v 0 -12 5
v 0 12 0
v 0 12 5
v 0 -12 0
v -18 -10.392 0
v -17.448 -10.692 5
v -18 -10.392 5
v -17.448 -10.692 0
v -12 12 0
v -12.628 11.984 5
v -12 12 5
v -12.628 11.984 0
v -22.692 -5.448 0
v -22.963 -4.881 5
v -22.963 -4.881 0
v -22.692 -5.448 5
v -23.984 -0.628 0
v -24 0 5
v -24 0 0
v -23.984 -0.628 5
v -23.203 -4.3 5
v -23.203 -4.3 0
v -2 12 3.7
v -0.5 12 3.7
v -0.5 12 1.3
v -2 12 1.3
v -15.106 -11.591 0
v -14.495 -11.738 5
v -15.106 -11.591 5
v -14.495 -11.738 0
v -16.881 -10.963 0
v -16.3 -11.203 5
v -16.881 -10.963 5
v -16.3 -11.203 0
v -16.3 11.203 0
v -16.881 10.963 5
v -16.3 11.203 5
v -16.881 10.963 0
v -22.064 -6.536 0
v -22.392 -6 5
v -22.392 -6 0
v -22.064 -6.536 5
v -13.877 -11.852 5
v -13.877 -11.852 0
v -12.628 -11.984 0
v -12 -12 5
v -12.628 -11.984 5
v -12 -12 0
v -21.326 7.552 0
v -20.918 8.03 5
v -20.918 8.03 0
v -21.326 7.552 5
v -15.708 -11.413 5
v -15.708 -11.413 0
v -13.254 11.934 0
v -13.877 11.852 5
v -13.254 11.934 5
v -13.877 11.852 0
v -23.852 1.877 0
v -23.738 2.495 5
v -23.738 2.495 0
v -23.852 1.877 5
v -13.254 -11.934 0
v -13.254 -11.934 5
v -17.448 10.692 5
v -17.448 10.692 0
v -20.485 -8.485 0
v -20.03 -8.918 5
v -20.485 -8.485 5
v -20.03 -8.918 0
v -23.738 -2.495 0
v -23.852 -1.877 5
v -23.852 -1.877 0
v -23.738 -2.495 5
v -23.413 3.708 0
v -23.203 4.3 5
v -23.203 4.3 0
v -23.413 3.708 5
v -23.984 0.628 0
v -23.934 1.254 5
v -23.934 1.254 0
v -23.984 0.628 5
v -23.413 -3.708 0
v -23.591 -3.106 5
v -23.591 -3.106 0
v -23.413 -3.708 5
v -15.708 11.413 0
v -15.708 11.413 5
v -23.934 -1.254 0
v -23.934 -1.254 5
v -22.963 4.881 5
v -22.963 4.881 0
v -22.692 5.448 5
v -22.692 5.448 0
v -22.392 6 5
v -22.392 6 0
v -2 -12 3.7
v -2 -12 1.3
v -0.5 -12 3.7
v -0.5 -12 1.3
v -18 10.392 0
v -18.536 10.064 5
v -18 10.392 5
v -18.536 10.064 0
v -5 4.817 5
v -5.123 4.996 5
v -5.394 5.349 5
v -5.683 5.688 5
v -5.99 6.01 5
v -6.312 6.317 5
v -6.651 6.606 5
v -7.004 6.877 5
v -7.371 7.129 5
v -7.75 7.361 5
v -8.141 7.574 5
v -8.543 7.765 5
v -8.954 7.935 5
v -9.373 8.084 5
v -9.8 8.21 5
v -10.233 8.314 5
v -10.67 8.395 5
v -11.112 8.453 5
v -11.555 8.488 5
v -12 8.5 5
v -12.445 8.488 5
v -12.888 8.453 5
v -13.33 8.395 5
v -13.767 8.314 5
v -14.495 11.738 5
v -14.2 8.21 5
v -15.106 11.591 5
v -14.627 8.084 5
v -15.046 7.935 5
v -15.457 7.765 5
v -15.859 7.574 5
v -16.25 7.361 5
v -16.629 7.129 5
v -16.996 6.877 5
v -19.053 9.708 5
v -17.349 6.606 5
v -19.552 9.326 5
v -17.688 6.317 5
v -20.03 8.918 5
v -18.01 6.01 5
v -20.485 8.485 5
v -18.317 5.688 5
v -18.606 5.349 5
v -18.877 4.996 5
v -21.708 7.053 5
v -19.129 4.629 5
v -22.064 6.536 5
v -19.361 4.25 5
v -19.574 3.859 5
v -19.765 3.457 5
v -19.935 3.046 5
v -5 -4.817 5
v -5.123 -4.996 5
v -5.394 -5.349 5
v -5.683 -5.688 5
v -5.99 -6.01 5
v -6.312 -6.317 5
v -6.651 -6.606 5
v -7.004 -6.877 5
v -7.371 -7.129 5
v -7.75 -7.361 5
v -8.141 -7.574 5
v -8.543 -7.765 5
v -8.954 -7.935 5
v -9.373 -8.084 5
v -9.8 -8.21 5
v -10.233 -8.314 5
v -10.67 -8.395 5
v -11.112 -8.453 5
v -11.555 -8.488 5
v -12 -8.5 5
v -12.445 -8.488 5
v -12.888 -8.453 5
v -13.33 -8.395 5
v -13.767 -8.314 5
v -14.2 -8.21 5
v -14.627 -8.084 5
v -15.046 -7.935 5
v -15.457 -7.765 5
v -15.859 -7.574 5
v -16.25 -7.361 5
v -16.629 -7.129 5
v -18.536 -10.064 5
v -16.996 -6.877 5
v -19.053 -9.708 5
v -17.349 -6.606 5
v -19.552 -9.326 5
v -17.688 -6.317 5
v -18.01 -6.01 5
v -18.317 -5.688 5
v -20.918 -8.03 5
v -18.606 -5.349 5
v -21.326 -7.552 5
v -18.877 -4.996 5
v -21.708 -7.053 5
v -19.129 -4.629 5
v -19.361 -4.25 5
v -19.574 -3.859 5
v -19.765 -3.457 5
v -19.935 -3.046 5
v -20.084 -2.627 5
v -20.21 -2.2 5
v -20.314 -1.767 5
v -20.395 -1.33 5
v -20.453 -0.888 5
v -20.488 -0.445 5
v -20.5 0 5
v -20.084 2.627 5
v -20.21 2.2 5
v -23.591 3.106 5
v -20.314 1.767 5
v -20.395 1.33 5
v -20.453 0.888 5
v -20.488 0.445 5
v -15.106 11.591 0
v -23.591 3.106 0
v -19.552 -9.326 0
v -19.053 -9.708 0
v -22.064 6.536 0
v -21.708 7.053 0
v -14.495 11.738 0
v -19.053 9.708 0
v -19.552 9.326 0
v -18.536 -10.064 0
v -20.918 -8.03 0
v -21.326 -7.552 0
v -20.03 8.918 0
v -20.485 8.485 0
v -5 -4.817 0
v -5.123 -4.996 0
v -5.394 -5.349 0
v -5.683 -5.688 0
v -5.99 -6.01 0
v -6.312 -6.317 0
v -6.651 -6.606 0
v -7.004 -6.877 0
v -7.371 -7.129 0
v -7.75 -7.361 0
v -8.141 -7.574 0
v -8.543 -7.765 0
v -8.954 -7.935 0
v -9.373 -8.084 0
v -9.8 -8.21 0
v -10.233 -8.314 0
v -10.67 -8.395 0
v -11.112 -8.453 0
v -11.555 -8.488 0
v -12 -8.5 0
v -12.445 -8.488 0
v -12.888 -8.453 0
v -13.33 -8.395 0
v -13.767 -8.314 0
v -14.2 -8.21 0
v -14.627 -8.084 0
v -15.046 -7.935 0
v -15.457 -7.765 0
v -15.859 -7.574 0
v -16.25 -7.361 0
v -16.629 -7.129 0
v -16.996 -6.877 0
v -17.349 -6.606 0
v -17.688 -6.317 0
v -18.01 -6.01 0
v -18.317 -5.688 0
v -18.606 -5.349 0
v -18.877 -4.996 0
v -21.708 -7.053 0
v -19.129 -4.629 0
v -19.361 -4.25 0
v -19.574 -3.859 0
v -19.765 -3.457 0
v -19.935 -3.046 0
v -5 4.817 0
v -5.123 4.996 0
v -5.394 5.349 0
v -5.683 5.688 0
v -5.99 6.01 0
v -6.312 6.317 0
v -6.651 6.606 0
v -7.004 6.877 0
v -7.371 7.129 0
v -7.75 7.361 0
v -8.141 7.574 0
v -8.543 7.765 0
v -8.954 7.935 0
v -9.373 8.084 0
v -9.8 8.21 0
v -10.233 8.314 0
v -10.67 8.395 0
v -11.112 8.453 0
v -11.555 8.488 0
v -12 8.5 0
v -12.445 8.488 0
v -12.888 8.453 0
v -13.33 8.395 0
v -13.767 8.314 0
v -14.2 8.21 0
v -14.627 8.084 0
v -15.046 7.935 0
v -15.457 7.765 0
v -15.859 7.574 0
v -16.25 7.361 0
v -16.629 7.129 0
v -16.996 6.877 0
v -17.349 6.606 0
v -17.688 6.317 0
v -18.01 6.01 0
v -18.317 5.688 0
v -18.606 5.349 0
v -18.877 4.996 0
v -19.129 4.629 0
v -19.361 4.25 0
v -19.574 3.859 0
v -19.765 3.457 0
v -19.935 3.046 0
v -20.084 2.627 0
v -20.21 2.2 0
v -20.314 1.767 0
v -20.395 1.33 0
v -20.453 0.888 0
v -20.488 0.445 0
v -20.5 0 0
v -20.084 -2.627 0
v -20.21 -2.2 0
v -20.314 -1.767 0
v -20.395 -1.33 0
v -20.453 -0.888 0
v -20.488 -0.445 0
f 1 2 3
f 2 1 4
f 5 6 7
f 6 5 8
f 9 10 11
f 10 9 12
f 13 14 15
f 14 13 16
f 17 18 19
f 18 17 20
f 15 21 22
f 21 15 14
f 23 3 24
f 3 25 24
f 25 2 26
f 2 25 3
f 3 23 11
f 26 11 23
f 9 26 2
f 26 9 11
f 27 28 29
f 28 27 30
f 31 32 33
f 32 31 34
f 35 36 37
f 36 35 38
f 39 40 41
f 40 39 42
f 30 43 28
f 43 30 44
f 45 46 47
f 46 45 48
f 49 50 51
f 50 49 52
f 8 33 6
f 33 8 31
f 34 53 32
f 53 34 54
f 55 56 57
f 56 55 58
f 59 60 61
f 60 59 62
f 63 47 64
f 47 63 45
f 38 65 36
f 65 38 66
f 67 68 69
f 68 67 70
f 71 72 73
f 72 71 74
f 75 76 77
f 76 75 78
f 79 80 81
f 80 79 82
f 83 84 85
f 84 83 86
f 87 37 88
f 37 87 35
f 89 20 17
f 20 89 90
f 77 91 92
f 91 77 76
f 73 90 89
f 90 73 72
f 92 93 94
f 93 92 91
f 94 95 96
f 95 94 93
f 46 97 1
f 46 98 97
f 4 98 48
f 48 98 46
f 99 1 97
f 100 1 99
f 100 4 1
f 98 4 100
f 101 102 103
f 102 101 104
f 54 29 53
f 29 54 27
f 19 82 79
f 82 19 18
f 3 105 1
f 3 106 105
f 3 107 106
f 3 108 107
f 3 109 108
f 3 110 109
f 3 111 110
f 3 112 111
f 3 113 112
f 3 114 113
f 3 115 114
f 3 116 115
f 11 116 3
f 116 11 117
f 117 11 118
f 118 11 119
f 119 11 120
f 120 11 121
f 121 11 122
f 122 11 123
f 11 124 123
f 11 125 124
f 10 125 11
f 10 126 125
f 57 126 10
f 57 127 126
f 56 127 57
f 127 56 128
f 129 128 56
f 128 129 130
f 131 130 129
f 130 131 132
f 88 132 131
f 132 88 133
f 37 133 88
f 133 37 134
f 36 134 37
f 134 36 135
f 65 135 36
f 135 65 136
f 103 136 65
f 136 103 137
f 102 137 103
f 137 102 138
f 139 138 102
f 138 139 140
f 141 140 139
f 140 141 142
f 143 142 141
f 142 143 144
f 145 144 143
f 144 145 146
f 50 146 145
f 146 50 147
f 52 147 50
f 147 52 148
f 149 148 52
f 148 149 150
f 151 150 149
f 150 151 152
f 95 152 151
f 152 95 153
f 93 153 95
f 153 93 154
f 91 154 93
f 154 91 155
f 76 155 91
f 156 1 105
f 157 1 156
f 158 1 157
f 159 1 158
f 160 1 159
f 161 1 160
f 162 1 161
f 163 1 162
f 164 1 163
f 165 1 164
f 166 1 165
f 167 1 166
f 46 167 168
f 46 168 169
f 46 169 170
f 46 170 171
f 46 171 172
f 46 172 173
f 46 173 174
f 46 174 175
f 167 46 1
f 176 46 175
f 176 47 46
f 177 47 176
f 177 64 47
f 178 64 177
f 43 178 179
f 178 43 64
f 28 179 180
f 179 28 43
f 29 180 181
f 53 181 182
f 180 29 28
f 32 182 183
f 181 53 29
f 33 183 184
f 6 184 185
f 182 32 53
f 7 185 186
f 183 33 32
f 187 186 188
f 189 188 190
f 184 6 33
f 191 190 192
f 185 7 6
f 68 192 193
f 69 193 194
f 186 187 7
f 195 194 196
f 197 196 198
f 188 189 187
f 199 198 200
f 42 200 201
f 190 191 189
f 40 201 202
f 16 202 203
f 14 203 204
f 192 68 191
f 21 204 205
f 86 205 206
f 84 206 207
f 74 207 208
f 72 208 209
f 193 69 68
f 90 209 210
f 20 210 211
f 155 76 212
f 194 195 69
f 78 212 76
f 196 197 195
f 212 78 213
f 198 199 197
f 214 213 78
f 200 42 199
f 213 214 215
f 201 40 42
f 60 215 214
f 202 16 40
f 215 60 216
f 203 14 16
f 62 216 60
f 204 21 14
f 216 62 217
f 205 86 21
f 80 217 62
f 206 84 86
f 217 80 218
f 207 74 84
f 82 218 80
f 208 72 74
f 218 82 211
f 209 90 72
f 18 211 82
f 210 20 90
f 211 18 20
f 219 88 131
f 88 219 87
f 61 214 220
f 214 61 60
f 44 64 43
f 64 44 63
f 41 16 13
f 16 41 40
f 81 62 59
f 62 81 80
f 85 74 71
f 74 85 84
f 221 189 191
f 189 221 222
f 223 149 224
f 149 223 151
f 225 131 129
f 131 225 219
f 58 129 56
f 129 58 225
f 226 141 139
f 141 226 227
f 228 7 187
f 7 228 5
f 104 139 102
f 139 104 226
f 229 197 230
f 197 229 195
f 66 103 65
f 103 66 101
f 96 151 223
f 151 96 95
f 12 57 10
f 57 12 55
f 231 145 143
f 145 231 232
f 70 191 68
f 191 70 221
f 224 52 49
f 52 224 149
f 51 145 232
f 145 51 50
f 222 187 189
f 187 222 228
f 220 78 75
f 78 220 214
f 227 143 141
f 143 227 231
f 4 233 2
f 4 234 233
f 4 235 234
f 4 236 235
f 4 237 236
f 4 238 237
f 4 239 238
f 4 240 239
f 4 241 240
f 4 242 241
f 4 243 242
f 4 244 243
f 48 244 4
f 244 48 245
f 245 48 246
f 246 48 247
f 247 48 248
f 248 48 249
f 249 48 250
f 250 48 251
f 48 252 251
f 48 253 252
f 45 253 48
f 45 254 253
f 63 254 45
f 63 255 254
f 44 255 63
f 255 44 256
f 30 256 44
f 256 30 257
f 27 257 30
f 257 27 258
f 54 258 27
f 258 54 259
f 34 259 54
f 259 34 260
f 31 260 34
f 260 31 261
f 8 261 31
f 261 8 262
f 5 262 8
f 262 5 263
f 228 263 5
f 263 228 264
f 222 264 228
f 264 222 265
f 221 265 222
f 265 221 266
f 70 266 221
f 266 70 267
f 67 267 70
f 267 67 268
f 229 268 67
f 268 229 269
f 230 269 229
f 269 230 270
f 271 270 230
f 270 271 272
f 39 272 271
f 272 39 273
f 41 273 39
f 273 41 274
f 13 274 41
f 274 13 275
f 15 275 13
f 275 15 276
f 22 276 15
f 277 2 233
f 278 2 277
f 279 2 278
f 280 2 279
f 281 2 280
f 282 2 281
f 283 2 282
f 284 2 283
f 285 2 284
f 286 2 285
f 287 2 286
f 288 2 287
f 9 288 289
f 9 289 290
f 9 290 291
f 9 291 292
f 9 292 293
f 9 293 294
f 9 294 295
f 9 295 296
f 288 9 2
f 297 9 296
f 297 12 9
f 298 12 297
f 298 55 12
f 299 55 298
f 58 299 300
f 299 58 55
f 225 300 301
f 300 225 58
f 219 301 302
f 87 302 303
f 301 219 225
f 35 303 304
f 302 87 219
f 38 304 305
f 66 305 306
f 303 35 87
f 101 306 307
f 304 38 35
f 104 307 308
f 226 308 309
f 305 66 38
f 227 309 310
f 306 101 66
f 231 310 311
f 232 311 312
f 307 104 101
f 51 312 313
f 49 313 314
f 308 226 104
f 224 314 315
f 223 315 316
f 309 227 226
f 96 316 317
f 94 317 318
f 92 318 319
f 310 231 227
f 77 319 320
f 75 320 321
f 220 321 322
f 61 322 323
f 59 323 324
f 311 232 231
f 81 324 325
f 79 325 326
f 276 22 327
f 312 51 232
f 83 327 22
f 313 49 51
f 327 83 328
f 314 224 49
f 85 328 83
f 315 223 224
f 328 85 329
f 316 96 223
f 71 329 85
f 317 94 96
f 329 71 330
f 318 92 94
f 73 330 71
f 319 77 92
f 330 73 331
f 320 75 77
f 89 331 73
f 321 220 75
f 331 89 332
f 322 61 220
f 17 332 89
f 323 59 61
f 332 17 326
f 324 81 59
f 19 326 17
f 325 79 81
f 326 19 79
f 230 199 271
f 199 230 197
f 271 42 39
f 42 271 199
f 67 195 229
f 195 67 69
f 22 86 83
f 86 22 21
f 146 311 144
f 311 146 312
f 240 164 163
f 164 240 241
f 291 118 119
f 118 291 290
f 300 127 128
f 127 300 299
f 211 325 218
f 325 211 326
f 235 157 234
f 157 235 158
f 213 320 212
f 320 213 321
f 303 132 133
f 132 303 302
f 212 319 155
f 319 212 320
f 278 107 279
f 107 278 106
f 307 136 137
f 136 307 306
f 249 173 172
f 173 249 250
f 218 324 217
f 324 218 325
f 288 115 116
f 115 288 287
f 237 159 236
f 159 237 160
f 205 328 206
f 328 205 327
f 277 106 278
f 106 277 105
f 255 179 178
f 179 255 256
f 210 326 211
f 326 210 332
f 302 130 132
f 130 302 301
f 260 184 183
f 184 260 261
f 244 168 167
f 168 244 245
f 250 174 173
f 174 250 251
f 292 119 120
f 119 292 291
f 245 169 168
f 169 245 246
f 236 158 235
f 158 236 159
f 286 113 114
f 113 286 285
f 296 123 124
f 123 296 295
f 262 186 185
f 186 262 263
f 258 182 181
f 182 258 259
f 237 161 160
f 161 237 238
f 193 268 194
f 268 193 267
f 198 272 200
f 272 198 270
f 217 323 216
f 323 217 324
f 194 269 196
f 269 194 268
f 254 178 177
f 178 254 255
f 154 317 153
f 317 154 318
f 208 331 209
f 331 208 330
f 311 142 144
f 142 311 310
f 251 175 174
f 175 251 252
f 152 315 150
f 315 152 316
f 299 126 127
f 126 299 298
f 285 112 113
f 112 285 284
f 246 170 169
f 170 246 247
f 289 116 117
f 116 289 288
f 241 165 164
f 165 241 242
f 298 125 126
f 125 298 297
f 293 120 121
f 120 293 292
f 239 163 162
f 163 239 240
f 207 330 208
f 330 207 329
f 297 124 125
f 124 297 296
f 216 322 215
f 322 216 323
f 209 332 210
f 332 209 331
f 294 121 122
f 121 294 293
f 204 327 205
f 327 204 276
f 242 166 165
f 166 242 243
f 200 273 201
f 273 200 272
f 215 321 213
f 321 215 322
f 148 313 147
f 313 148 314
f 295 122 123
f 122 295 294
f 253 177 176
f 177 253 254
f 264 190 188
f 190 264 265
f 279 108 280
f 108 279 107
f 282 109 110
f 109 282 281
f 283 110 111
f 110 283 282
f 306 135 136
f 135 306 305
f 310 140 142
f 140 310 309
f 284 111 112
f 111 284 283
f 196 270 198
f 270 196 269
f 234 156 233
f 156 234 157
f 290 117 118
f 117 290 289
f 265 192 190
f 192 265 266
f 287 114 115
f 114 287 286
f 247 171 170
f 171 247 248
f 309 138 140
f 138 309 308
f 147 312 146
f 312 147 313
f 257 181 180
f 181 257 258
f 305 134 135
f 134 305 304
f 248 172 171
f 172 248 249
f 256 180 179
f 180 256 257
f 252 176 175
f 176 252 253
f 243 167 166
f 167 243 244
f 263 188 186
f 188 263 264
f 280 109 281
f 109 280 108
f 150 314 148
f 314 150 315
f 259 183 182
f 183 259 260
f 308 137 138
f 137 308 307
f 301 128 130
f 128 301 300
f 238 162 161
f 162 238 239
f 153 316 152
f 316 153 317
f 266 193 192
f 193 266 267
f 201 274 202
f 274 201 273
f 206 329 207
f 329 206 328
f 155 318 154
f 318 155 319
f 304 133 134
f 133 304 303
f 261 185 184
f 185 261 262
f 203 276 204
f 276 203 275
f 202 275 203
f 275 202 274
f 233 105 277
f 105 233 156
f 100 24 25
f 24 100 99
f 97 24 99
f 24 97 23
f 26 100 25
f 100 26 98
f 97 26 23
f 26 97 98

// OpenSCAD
// SD card grip. Includes a support wall for easy printing. After printing
// remove the support wall with a knife, and glue the SD card with 
// super glue.

// Round surfaces smoothness. Small numbers such as 3, 4, 5 give interesting 
// results
$fn=120;

// Total model model.
total_length = 24;

// Total model width. Typically matches the width of the SD crd.
total_width = 24;

// Total model thickness.
total_thickness = 5;

// SD slot depth. Make sure it's small enough to enable proper insertion
// of the SD card, including extra distance for those 'toggle' in/oout
// mechanism when available.
sd_slot_depth = 2.0;

// SD slot thickness.
sd_slot_thickness = 2.4;

// Diameter of the grip thumb hole.
grip_hole_diameter = 17;

// Minimal distance between sd card slot and grip thumb hole.
sd_slot_to_grip_min_wall = 3;

// Thickness of slot support wall. Cut with a knife after printing. 
// Set to achive wall thickness of a single extrusion pass. Set
// to zero to disable.
support_wall_thickness = 0.5;

// Small positive numbers for maintaining manifold. No need tto change.
eps1 = 0.01;
eps2 = 2*eps1;
eps4 = 4*eps1;

// Part before any cutting.
module body() {
  intersection() {
    hull() {
      translate([-(total_length-total_width/2), 0, 0]) 
          cylinder(d=total_width, h=total_thickness);
      translate([-eps1, -total_width/2, 0]) 
          cube([eps1, total_width,      total_thickness]);
    }
    // Intesection is useful in case total_length < total_width.
    translate([-total_length, -total_width/2, 0])
      cube([total_length, total_width, total_thickness]);
  }
}

// Substractive.
module sd_slot() {
  cube_x = (support_wall_thickness <= 0)
      ? sd_slot_depth + eps1
      : sd_slot_depth - support_wall_thickness;
  translate([-sd_slot_depth, 
             -(total_width/2 + eps1), 
             (total_thickness - sd_slot_thickness)/2])
  #cube([cube_x, 
         total_width+eps2, 
         sd_slot_thickness]);  
}

// Substractive.
module grip_hole() {
  difference() {
    translate([-(total_length-total_width/2), 0, -eps1])
      cylinder(d=grip_hole_diameter, h=total_thickness+eps2);
    translate([-(sd_slot_depth+sd_slot_to_grip_min_wall),
               -total_width/2,
               -eps2 ])
        cube([sd_slot_depth+sd_slot_to_grip_min_wall, 
               total_width, 
               total_thickness+eps4]);
  }
}

module main() {
  difference() {
    body();
    sd_slot();
    grip_hole();
  }
}

main();
